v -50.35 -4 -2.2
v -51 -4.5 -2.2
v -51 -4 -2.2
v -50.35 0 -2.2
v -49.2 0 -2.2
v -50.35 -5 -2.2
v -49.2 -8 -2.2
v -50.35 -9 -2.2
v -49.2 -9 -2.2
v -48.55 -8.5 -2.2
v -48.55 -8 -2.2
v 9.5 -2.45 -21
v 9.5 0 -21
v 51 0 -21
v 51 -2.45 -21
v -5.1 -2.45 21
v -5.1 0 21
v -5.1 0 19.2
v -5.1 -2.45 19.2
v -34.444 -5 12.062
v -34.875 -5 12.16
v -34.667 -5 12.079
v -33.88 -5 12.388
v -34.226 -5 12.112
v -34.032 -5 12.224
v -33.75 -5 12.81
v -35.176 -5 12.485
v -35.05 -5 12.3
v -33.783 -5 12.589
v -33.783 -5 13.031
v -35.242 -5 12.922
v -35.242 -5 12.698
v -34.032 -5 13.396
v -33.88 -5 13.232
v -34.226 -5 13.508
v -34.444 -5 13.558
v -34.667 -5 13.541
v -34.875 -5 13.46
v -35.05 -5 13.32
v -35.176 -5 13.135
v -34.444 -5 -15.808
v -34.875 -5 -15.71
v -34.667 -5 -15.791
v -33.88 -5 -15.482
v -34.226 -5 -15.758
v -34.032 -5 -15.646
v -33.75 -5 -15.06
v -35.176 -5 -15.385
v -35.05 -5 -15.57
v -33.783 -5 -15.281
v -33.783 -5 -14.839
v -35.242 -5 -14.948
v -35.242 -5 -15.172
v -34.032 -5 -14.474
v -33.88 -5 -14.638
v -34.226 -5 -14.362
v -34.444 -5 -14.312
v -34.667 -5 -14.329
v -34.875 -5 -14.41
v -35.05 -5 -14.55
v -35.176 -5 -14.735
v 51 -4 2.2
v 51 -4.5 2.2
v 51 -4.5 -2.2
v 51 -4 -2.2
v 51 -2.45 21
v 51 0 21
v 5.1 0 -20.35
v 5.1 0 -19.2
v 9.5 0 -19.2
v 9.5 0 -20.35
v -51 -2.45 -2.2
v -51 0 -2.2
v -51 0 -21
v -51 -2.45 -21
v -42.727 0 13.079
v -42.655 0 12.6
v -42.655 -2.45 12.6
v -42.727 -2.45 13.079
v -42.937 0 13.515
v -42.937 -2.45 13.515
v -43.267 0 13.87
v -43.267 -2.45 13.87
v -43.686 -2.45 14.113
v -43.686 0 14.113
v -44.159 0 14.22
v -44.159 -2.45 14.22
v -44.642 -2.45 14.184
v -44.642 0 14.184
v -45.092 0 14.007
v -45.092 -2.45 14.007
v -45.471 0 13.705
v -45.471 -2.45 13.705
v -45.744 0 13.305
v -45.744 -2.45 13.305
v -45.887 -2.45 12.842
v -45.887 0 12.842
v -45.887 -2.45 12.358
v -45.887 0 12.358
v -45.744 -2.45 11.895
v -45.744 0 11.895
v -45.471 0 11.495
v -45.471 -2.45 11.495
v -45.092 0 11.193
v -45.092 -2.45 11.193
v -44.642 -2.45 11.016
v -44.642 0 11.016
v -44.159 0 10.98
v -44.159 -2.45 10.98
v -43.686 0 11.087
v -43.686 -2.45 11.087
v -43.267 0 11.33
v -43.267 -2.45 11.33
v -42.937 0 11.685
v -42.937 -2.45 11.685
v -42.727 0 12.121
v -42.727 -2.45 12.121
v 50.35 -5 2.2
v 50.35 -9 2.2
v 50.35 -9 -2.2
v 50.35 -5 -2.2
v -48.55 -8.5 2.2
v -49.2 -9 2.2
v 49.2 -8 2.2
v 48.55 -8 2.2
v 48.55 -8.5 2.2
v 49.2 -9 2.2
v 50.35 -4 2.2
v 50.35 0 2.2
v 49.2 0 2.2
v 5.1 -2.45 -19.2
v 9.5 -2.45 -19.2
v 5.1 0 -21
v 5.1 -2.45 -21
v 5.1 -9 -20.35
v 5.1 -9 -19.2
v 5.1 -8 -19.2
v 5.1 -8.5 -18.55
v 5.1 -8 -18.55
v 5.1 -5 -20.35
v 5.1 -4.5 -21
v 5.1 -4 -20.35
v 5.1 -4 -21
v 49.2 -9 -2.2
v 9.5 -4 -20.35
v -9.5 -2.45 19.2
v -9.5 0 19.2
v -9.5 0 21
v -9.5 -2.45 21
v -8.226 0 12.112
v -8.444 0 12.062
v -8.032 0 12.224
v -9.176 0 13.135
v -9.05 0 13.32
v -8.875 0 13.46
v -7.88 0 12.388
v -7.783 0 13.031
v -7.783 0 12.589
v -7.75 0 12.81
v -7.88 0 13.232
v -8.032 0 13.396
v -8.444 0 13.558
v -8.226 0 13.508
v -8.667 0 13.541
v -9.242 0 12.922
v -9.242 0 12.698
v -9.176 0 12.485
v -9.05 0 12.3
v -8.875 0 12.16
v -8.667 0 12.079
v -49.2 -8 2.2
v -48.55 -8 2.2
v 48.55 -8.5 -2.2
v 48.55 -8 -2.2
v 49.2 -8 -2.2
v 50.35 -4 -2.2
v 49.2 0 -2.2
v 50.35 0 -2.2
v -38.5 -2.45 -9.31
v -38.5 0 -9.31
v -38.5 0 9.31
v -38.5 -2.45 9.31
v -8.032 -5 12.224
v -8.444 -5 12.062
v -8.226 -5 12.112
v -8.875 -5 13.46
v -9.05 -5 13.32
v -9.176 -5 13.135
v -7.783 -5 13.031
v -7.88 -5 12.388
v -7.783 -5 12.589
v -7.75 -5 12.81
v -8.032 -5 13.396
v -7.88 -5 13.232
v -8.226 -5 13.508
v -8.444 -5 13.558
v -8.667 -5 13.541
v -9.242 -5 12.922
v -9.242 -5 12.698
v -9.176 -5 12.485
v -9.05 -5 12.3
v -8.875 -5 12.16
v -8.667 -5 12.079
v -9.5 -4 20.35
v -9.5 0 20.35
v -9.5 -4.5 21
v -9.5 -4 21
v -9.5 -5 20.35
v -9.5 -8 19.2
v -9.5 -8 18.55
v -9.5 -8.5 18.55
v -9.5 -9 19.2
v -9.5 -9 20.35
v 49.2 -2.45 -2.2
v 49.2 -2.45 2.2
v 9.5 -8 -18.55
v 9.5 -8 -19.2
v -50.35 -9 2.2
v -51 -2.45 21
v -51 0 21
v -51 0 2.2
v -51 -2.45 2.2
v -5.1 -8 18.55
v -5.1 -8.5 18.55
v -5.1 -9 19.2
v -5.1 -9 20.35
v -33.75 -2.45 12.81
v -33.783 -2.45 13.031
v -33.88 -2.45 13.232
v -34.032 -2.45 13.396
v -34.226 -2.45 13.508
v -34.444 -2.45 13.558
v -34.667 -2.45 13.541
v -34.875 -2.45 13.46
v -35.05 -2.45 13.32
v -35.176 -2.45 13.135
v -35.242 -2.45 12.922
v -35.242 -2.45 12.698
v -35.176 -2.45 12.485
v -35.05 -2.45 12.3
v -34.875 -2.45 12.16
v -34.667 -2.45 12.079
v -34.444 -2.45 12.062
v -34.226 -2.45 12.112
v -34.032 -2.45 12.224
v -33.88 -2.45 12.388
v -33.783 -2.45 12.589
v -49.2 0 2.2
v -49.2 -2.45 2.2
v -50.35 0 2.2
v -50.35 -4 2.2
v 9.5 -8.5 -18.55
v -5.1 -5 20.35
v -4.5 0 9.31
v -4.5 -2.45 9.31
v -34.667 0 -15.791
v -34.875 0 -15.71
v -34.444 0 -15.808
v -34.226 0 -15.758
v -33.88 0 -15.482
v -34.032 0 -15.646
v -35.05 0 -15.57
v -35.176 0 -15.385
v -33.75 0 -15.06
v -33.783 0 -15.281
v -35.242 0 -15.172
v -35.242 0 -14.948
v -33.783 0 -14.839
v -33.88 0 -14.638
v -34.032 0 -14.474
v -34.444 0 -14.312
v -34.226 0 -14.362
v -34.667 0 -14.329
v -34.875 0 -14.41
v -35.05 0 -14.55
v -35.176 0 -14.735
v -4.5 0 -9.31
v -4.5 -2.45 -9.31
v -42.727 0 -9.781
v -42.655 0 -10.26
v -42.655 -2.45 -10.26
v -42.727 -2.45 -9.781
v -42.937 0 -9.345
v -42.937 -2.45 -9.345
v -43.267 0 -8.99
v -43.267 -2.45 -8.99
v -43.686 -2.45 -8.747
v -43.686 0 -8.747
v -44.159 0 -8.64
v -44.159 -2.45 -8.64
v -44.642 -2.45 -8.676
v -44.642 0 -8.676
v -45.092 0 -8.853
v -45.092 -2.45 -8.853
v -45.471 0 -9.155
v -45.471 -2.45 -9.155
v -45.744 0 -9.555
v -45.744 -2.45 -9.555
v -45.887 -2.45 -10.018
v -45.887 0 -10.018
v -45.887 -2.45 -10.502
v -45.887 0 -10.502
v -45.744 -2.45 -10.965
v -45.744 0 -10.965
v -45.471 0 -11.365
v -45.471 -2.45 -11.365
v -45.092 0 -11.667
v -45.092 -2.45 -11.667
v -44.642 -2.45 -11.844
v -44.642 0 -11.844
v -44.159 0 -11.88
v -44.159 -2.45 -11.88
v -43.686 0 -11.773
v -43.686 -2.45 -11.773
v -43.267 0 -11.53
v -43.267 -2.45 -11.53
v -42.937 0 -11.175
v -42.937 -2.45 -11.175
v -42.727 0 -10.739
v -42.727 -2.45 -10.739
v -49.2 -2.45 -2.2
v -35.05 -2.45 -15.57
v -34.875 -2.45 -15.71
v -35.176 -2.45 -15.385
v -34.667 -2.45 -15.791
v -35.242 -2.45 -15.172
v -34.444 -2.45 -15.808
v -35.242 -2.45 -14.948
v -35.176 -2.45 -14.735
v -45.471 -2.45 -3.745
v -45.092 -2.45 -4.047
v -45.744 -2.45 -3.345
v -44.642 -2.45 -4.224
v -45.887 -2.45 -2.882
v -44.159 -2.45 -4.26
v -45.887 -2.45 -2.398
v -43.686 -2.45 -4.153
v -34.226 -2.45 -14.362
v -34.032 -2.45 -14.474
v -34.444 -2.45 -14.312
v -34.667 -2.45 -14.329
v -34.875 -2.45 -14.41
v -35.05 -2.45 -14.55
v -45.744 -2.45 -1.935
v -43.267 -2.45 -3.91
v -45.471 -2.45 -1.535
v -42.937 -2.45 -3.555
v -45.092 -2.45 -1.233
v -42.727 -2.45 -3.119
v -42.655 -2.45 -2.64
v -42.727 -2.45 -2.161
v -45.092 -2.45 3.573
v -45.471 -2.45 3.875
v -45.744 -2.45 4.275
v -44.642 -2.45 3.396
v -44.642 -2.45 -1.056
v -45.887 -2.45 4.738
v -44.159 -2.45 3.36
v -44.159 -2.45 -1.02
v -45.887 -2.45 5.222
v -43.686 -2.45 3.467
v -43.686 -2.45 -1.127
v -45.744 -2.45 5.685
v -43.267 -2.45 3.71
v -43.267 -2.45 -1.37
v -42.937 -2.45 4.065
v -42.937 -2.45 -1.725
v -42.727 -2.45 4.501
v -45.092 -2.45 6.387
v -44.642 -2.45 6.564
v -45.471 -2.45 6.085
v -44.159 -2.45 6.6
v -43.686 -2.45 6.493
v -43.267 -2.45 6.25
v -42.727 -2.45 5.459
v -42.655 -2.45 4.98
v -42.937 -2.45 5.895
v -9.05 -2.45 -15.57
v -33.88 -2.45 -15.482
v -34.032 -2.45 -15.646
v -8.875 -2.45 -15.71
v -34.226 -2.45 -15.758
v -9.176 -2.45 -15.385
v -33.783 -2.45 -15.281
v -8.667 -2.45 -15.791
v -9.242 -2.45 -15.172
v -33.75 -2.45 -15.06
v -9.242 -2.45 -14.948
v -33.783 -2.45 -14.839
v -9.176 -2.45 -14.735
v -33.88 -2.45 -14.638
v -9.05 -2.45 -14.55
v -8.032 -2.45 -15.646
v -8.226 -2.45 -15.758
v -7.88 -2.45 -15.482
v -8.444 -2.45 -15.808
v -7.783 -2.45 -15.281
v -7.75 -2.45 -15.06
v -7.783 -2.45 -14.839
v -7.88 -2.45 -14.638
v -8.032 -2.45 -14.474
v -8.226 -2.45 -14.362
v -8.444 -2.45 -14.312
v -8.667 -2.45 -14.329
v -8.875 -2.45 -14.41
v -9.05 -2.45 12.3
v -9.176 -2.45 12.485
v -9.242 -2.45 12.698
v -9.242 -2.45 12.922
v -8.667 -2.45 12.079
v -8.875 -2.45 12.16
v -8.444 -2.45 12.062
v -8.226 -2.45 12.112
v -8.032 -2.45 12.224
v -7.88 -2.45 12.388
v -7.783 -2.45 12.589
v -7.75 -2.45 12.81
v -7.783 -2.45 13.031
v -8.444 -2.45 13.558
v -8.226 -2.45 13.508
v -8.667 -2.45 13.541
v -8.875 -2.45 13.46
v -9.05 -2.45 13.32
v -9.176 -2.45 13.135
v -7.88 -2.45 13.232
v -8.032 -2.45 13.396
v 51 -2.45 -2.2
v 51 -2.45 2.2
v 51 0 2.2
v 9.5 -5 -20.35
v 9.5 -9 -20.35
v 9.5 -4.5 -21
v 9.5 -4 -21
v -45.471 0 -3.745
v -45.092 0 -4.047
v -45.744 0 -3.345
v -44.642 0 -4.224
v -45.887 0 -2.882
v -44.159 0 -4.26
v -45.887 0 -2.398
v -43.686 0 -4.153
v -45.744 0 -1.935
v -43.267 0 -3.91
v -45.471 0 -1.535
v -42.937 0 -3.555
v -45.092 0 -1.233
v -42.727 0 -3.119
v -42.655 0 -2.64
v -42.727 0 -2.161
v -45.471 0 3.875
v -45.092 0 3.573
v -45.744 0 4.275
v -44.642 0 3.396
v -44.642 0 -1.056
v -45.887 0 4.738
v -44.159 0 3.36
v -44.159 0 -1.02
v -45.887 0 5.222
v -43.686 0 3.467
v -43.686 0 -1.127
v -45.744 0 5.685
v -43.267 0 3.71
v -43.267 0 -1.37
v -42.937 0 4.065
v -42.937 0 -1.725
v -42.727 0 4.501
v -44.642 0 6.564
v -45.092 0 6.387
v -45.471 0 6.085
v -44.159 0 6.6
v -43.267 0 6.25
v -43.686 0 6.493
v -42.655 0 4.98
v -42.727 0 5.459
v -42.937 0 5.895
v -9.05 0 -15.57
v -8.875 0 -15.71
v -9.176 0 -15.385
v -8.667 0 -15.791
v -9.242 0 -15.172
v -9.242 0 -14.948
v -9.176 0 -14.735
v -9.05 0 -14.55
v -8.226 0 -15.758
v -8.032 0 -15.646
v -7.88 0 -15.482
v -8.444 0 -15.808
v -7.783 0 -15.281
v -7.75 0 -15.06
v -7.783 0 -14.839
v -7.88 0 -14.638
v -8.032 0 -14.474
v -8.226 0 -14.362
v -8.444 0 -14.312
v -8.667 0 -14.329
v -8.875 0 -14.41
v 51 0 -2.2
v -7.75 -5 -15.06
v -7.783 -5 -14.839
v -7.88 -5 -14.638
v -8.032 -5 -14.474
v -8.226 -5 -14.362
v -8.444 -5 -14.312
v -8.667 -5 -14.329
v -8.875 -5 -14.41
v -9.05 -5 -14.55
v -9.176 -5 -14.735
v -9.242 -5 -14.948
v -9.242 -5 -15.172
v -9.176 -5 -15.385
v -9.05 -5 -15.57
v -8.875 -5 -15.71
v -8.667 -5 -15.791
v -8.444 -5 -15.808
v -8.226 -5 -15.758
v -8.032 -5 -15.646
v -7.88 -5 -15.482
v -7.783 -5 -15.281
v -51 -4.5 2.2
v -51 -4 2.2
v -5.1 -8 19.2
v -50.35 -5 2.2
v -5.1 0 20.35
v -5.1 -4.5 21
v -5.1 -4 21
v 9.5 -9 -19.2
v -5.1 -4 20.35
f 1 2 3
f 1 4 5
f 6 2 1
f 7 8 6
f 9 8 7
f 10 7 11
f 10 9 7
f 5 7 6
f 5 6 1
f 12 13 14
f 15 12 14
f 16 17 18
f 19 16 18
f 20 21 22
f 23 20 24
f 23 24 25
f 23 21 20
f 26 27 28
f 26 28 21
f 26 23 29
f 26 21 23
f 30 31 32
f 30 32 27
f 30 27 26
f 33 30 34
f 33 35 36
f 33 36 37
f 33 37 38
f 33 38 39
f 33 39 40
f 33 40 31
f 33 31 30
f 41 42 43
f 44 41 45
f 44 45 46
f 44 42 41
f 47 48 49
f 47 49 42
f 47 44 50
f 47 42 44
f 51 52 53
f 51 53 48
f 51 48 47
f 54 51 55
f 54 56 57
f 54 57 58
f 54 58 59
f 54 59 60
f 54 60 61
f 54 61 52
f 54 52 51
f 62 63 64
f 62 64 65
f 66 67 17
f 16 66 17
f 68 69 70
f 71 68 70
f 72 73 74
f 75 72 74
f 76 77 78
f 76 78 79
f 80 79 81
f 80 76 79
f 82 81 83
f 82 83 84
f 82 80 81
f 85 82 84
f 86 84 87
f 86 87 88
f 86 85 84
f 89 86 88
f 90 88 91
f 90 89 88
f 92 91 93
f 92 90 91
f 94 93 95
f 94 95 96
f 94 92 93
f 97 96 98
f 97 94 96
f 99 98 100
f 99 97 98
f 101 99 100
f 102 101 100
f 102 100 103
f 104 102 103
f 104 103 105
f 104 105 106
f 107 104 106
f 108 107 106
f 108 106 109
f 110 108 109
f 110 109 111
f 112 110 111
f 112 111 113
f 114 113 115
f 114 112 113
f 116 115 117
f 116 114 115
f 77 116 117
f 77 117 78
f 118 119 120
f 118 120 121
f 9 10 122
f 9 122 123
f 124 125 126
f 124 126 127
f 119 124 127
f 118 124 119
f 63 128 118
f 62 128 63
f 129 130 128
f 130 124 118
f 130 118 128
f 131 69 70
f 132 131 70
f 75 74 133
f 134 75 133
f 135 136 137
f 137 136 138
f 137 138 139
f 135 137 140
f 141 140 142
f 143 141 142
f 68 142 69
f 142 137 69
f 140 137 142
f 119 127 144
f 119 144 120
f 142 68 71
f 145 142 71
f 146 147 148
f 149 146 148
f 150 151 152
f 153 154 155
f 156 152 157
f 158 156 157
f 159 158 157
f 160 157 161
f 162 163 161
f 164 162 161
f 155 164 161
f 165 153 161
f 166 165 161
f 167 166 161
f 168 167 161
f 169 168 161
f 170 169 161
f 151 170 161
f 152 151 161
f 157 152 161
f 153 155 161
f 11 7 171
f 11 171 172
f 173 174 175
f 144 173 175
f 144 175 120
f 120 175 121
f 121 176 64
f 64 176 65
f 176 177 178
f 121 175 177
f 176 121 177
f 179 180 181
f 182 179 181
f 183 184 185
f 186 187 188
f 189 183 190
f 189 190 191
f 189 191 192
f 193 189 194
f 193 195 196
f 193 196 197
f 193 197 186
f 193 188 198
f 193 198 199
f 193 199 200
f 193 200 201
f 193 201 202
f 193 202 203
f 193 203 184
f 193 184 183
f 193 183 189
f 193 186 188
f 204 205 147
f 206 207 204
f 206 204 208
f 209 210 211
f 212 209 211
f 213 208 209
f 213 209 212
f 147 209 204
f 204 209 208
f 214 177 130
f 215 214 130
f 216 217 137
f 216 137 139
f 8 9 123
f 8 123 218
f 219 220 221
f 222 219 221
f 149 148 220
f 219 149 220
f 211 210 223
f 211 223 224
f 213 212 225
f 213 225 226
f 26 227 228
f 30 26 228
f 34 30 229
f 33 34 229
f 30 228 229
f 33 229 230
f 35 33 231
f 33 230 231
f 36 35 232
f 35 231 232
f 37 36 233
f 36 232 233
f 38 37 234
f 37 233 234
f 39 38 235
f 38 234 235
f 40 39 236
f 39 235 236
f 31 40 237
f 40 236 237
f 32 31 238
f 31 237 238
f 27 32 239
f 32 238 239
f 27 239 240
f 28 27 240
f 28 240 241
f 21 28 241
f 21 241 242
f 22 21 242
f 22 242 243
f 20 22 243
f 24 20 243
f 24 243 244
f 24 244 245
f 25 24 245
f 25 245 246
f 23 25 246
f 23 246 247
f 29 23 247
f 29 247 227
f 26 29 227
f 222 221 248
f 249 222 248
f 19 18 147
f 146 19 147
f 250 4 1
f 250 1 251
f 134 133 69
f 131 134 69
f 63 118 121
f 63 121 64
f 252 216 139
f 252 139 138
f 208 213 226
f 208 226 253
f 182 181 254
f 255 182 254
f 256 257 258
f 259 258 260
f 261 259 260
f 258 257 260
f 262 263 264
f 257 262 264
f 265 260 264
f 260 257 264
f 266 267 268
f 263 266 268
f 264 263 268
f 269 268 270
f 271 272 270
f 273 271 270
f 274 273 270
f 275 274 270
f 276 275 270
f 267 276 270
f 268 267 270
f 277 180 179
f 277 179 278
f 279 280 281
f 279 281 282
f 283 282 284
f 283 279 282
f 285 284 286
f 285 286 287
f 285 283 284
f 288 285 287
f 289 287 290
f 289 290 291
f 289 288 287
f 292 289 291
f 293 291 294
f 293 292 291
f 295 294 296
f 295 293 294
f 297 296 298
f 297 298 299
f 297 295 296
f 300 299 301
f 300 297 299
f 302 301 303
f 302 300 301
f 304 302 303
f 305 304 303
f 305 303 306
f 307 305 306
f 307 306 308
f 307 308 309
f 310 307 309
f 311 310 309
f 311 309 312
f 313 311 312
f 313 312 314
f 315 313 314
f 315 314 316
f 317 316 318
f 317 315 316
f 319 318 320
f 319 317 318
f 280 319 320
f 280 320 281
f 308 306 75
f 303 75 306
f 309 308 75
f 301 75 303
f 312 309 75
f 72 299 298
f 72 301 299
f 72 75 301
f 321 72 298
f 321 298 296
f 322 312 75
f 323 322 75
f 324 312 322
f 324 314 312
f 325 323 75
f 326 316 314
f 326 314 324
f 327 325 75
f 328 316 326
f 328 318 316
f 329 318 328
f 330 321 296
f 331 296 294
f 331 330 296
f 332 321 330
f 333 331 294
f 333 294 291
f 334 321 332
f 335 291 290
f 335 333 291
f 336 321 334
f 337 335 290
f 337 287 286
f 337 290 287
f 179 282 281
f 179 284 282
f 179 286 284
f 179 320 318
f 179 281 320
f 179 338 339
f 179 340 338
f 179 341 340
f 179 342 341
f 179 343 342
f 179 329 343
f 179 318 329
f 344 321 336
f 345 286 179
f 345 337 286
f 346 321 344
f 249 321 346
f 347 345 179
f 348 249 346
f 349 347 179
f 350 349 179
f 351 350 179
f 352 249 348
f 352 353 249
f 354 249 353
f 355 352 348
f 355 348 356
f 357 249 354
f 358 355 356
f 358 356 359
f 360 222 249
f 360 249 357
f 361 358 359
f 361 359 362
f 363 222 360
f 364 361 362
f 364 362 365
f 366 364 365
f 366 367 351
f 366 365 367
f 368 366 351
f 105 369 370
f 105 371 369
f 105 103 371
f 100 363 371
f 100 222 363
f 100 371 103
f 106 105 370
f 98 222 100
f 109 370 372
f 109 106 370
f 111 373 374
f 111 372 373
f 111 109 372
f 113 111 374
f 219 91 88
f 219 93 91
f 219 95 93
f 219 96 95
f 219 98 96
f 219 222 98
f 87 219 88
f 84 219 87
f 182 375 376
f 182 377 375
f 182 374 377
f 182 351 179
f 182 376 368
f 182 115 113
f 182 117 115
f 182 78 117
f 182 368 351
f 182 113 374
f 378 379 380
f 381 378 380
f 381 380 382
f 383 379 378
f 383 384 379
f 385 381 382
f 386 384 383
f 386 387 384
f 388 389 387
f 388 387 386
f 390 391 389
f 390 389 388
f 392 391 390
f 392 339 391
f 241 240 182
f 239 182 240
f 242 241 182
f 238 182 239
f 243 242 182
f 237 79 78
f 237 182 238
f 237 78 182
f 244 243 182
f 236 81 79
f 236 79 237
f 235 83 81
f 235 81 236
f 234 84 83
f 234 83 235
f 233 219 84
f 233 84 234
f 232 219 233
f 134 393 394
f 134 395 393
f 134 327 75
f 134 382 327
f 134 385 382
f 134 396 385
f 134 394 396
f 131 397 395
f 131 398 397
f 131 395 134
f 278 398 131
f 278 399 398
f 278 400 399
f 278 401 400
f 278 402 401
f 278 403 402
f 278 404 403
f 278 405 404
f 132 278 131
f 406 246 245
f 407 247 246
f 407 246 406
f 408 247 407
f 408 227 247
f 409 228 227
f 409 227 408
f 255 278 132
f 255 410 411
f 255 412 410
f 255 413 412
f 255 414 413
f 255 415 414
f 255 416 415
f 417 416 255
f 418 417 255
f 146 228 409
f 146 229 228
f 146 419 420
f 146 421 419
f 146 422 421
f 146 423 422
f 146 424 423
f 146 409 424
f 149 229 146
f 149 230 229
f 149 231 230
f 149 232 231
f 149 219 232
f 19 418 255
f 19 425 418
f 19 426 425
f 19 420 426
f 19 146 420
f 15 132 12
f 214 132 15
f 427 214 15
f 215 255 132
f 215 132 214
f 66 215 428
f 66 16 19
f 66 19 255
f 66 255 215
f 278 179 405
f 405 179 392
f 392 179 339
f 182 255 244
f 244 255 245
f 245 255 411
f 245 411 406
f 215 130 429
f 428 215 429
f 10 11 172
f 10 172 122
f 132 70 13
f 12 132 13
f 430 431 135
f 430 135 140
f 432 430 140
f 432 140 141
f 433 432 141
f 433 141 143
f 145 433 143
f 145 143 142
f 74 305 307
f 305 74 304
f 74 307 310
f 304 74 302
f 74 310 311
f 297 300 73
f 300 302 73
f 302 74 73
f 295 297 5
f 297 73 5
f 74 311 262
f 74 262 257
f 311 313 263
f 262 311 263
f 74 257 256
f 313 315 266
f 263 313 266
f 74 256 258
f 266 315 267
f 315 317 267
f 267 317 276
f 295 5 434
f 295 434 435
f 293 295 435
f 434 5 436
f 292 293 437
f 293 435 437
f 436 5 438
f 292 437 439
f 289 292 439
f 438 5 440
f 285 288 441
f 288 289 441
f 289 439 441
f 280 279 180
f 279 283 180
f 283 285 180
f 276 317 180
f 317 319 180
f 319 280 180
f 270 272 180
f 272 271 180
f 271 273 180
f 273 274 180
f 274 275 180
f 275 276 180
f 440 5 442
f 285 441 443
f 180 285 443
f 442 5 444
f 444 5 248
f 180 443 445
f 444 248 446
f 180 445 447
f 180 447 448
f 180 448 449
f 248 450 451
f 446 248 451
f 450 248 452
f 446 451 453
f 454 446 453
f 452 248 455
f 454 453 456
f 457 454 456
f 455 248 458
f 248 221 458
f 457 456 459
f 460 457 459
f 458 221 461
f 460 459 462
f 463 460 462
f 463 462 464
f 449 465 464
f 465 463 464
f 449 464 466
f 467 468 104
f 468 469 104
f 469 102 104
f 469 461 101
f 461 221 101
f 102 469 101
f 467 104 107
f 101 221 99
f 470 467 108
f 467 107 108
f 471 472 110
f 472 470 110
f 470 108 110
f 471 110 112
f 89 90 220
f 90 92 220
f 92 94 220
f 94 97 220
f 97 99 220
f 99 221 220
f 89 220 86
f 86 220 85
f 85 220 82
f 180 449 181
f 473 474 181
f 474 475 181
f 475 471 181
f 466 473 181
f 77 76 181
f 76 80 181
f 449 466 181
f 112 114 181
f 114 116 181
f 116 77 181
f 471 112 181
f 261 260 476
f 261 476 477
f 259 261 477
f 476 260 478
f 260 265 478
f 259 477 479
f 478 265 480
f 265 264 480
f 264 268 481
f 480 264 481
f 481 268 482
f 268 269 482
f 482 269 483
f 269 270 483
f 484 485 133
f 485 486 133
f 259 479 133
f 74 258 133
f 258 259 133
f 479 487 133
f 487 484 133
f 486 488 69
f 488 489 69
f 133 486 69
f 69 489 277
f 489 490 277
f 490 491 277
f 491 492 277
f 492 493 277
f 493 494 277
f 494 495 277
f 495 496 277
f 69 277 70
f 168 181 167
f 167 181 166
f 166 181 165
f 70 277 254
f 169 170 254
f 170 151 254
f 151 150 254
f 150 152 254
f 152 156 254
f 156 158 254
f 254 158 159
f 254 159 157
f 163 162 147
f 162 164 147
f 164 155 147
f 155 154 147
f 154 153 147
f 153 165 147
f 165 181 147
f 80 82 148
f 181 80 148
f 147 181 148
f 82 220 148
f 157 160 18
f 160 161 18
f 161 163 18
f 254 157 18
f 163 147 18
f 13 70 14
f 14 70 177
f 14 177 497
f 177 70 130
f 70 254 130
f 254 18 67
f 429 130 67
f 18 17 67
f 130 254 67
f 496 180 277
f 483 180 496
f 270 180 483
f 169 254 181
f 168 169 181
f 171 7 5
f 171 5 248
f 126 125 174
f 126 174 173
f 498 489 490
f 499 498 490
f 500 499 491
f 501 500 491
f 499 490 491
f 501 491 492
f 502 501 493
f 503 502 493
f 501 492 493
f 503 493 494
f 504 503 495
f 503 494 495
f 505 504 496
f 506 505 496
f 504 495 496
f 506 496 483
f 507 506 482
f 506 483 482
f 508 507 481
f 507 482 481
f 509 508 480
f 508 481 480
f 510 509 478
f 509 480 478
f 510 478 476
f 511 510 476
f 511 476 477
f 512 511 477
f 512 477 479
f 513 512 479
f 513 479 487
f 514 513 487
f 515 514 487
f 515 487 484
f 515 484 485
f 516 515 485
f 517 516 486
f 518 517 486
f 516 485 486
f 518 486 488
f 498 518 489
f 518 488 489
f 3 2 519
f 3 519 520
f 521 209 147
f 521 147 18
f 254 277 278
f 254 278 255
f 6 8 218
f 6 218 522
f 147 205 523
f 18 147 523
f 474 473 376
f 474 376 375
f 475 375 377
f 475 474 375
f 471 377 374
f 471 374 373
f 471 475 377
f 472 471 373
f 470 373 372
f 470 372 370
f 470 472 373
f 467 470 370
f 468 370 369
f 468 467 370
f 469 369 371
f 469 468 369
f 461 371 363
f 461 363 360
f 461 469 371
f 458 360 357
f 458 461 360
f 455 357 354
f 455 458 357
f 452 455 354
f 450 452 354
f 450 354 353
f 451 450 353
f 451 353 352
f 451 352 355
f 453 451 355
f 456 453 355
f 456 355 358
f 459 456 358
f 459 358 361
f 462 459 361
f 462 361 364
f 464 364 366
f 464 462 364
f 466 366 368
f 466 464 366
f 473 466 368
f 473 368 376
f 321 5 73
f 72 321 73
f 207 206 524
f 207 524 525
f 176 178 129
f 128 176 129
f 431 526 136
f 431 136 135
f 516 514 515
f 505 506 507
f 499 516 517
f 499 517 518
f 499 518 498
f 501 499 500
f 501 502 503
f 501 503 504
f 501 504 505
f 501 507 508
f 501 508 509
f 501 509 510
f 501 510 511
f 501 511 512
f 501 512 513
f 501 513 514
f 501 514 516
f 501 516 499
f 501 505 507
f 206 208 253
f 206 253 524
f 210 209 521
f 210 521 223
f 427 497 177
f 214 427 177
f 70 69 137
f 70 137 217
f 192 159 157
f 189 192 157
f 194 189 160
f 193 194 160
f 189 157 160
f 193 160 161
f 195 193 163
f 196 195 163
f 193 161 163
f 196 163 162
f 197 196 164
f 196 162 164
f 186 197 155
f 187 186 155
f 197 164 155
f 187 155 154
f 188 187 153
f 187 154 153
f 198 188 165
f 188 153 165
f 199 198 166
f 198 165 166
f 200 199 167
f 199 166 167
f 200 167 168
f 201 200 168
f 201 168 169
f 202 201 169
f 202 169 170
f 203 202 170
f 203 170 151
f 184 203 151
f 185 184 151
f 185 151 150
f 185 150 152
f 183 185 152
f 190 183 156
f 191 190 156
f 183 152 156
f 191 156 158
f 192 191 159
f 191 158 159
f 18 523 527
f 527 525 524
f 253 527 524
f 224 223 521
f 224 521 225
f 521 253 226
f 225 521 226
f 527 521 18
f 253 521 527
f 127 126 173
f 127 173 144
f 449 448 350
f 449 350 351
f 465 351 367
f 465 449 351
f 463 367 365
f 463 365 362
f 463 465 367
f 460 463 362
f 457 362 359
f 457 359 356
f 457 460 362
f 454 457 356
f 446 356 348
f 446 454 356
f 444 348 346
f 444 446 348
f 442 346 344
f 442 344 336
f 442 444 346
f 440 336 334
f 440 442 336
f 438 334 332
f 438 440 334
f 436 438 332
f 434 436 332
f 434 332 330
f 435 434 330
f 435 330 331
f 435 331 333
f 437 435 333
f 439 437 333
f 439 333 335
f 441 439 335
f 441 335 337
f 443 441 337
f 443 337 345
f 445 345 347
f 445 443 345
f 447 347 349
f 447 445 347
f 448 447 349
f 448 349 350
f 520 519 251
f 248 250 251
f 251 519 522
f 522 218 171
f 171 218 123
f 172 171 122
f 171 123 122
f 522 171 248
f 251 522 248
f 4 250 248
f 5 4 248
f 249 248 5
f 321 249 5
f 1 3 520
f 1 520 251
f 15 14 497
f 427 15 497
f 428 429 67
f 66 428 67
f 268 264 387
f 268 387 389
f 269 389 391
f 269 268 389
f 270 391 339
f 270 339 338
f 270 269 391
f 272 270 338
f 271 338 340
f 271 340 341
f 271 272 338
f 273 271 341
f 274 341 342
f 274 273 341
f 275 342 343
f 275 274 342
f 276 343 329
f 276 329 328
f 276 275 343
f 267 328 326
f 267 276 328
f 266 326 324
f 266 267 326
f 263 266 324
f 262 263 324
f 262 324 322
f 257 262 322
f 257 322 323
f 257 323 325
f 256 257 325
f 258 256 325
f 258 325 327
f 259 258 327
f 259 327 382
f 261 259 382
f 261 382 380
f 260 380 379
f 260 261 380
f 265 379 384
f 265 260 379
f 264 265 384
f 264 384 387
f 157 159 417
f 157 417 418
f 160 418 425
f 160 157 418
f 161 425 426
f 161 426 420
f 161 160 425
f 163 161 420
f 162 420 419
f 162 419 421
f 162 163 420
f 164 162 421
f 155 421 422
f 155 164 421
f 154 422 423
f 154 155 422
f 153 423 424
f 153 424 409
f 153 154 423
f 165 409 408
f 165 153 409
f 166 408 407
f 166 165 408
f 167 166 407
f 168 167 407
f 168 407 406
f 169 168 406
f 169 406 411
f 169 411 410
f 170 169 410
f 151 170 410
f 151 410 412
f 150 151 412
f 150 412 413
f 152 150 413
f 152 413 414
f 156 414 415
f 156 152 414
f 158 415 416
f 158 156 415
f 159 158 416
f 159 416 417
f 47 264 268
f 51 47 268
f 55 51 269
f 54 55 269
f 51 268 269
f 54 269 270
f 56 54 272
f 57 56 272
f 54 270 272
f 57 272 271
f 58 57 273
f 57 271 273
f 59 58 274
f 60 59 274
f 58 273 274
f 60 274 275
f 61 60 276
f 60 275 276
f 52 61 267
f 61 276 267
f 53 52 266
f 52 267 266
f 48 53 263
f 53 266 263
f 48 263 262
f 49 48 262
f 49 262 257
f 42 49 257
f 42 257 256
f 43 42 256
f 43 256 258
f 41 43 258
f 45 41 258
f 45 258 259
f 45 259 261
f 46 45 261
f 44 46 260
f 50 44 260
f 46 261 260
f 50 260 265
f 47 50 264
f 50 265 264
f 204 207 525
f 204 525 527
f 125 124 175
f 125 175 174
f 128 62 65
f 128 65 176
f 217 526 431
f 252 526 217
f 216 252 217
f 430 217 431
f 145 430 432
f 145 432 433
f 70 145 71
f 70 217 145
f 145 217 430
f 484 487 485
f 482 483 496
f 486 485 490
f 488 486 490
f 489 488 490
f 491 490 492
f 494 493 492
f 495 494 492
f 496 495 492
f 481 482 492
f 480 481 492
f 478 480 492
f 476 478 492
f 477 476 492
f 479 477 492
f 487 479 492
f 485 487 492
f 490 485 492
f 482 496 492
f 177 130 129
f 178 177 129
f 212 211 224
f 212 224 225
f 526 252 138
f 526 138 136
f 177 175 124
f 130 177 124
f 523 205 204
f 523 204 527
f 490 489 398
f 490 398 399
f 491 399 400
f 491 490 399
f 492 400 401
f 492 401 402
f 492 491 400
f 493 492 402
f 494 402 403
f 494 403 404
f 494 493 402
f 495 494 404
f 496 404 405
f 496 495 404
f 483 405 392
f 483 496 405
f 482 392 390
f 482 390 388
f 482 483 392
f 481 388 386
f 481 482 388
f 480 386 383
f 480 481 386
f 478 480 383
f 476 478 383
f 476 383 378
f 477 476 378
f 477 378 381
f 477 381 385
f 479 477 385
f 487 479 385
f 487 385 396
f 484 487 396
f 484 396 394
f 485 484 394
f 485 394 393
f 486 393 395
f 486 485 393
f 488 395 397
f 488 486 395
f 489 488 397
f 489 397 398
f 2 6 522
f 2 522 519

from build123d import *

# Parameters (mm, degrees)
F0_R      = 0.75
F0_R_2    = 1.625
F0_W      = 34
F0_H      = 18.62
F1_DEPTH  = 2.45
F0_W_2    = 4.4
F0_H_2    = 1.15
F0_W_3    = 1.15
F0_H_3    = 4.4
F2_DEPTH  = 8
F3_DEPTH  = 5
F4_DEPTH  = 5
F5_DEPTH  = 5
F10_DEPTH = 4.4
F11_DEPTH = 4.4
F12_DEPTH = 4.4
F13_DEPTH = 4.4


with BuildPart() as f1:
    # F0 (on Front) → F1 (new body)
    with BuildSketch(Plane.XZ):
        Polygon((-9.5, 21), (-51, 21), (-51, 2.2), (-50.35, 2.2), (-49.2, 2.2), (-49.2, -2.2), (-50.35, -2.2), (-51, -2.2), (-51, -21), (5.1, -21), (5.1, -20.35), (5.1, -19.2), (9.5, -19.2), (9.5, -20.35), (9.5, -21), (51, -21), (51, -2.2), (50.35, -2.2), (49.2, -2.2), (49.2, 2.2), (50.35, 2.2), (51, 2.2), (51, 21), (-5.1, 21), (-5.1, 20.35), (-5.1, 19.2), (-9.5, 19.2), (-9.5, 20.35), align=None)
        with Locations((-34.5, -15.06)):
            Circle(F0_R, mode=Mode.SUBTRACT)
        with Locations((-8.5, -15.06)):
            Circle(F0_R, mode=Mode.SUBTRACT)
        with Locations((-44.28, -10.26)):
            Circle(F0_R_2, mode=Mode.SUBTRACT)
        with Locations((-44.28, -2.64)):
            Circle(F0_R_2, mode=Mode.SUBTRACT)
        with Locations((-44.28, 4.98)):
            Circle(F0_R_2, mode=Mode.SUBTRACT)
        with Locations((-21.5, 0)):
            Rectangle(F0_W, F0_H, mode=Mode.SUBTRACT)
        with Locations((-44.28, 12.6)):
            Circle(F0_R_2, mode=Mode.SUBTRACT)
        with Locations((-34.5, 12.81)):
            Circle(F0_R, mode=Mode.SUBTRACT)
        with Locations((-8.5, 12.81)):
            Circle(F0_R, mode=Mode.SUBTRACT)
    extrude(amount=F1_DEPTH)

    # F0 (on Front) → F3 (join)
    with BuildSketch(Plane.XZ):
        with Locations((-34.5, 12.81)):
            Circle(F0_R)
    extrude(amount=F3_DEPTH)


with BuildPart() as f2:
    # F0 (on Front) → F2 (new body)
    with BuildSketch(Plane.XZ):
        with Locations((-7.3, 19.775)):
            Rectangle(F0_W_2, F0_H_2)
        with Locations((-49.775, 0)):
            Rectangle(F0_W_3, F0_H_3)
        with Locations((49.775, 0)):
            Rectangle(F0_W_3, F0_H_3)
        with Locations((7.3, -19.775)):
            Rectangle(F0_W_2, F0_H_2)
    extrude(amount=F2_DEPTH)

    # F9 (on face) → F10 (join)
    with BuildSketch(Plane.XY.offset(2.2)):
        Polygon((50.35, -9), (50.35, -8), (49.2, -8), (48.55, -8), (48.55, -8.5), (49.2, -9), align=None)
        Polygon((51, -4), (50.35, -4), (50.35, -5), (51, -4.5), align=None)
    extrude(amount=-F10_DEPTH)

    # F8 (on face) → F11 (join)
    with BuildSketch(Plane.YZ.offset(9.5)):
        Polygon((-9, -20.35), (-8, -20.35), (-8, -19.2), (-8, -18.55), (-8.5, -18.55), (-9, -19.2), align=None)
        Polygon((-4, -21), (-4, -20.35), (-5, -20.35), (-4.5, -21), align=None)
    extrude(amount=-F11_DEPTH)

    # F7 (on face) → F12 (join)
    with BuildSketch(Plane(origin=(0, 0, -2.2), x_dir=(1, 0, 0), z_dir=(0, 0, -1))):
        Polygon((-50.35, 9), (-50.35, 8), (-49.2, 8), (-48.55, 8), (-48.55, 8.5), (-49.2, 9), align=None)
        Polygon((-51, 4), (-50.35, 4), (-50.35, 5), (-51, 4.5), align=None)
    extrude(amount=-F12_DEPTH)

    # F6 (on face) → F13 (join)
    with BuildSketch(Plane(origin=(-9.5, 0, 0), x_dir=(0, -1, 0), z_dir=(-1, 0, 0))):
        Polygon((9, 20.35), (8, 20.35), (8, 19.2), (8, 18.55), (8.5, 18.55), (9, 19.2), align=None)
        Polygon((4, 21), (4, 20.35), (5, 20.35), (4.5, 21), align=None)
    extrude(amount=-F13_DEPTH)


with BuildPart() as f4:
    # F0 (on Front) → F4 (new body)
    with BuildSketch(Plane.XZ):
        with Locations((-8.5, 12.81)):
            Circle(F0_R)
    extrude(amount=F4_DEPTH)


with BuildPart() as f5:
    # F0 (on Front) → F5 (new body)
    with BuildSketch(Plane.XZ):
        with Locations((-34.5, -15.06)):
            Circle(F0_R)
        with Locations((-8.5, -15.06)):
            Circle(F0_R)
    extrude(amount=F5_DEPTH)


solid = Compound([f1.part, f2.part, f4.part, f5.part])
